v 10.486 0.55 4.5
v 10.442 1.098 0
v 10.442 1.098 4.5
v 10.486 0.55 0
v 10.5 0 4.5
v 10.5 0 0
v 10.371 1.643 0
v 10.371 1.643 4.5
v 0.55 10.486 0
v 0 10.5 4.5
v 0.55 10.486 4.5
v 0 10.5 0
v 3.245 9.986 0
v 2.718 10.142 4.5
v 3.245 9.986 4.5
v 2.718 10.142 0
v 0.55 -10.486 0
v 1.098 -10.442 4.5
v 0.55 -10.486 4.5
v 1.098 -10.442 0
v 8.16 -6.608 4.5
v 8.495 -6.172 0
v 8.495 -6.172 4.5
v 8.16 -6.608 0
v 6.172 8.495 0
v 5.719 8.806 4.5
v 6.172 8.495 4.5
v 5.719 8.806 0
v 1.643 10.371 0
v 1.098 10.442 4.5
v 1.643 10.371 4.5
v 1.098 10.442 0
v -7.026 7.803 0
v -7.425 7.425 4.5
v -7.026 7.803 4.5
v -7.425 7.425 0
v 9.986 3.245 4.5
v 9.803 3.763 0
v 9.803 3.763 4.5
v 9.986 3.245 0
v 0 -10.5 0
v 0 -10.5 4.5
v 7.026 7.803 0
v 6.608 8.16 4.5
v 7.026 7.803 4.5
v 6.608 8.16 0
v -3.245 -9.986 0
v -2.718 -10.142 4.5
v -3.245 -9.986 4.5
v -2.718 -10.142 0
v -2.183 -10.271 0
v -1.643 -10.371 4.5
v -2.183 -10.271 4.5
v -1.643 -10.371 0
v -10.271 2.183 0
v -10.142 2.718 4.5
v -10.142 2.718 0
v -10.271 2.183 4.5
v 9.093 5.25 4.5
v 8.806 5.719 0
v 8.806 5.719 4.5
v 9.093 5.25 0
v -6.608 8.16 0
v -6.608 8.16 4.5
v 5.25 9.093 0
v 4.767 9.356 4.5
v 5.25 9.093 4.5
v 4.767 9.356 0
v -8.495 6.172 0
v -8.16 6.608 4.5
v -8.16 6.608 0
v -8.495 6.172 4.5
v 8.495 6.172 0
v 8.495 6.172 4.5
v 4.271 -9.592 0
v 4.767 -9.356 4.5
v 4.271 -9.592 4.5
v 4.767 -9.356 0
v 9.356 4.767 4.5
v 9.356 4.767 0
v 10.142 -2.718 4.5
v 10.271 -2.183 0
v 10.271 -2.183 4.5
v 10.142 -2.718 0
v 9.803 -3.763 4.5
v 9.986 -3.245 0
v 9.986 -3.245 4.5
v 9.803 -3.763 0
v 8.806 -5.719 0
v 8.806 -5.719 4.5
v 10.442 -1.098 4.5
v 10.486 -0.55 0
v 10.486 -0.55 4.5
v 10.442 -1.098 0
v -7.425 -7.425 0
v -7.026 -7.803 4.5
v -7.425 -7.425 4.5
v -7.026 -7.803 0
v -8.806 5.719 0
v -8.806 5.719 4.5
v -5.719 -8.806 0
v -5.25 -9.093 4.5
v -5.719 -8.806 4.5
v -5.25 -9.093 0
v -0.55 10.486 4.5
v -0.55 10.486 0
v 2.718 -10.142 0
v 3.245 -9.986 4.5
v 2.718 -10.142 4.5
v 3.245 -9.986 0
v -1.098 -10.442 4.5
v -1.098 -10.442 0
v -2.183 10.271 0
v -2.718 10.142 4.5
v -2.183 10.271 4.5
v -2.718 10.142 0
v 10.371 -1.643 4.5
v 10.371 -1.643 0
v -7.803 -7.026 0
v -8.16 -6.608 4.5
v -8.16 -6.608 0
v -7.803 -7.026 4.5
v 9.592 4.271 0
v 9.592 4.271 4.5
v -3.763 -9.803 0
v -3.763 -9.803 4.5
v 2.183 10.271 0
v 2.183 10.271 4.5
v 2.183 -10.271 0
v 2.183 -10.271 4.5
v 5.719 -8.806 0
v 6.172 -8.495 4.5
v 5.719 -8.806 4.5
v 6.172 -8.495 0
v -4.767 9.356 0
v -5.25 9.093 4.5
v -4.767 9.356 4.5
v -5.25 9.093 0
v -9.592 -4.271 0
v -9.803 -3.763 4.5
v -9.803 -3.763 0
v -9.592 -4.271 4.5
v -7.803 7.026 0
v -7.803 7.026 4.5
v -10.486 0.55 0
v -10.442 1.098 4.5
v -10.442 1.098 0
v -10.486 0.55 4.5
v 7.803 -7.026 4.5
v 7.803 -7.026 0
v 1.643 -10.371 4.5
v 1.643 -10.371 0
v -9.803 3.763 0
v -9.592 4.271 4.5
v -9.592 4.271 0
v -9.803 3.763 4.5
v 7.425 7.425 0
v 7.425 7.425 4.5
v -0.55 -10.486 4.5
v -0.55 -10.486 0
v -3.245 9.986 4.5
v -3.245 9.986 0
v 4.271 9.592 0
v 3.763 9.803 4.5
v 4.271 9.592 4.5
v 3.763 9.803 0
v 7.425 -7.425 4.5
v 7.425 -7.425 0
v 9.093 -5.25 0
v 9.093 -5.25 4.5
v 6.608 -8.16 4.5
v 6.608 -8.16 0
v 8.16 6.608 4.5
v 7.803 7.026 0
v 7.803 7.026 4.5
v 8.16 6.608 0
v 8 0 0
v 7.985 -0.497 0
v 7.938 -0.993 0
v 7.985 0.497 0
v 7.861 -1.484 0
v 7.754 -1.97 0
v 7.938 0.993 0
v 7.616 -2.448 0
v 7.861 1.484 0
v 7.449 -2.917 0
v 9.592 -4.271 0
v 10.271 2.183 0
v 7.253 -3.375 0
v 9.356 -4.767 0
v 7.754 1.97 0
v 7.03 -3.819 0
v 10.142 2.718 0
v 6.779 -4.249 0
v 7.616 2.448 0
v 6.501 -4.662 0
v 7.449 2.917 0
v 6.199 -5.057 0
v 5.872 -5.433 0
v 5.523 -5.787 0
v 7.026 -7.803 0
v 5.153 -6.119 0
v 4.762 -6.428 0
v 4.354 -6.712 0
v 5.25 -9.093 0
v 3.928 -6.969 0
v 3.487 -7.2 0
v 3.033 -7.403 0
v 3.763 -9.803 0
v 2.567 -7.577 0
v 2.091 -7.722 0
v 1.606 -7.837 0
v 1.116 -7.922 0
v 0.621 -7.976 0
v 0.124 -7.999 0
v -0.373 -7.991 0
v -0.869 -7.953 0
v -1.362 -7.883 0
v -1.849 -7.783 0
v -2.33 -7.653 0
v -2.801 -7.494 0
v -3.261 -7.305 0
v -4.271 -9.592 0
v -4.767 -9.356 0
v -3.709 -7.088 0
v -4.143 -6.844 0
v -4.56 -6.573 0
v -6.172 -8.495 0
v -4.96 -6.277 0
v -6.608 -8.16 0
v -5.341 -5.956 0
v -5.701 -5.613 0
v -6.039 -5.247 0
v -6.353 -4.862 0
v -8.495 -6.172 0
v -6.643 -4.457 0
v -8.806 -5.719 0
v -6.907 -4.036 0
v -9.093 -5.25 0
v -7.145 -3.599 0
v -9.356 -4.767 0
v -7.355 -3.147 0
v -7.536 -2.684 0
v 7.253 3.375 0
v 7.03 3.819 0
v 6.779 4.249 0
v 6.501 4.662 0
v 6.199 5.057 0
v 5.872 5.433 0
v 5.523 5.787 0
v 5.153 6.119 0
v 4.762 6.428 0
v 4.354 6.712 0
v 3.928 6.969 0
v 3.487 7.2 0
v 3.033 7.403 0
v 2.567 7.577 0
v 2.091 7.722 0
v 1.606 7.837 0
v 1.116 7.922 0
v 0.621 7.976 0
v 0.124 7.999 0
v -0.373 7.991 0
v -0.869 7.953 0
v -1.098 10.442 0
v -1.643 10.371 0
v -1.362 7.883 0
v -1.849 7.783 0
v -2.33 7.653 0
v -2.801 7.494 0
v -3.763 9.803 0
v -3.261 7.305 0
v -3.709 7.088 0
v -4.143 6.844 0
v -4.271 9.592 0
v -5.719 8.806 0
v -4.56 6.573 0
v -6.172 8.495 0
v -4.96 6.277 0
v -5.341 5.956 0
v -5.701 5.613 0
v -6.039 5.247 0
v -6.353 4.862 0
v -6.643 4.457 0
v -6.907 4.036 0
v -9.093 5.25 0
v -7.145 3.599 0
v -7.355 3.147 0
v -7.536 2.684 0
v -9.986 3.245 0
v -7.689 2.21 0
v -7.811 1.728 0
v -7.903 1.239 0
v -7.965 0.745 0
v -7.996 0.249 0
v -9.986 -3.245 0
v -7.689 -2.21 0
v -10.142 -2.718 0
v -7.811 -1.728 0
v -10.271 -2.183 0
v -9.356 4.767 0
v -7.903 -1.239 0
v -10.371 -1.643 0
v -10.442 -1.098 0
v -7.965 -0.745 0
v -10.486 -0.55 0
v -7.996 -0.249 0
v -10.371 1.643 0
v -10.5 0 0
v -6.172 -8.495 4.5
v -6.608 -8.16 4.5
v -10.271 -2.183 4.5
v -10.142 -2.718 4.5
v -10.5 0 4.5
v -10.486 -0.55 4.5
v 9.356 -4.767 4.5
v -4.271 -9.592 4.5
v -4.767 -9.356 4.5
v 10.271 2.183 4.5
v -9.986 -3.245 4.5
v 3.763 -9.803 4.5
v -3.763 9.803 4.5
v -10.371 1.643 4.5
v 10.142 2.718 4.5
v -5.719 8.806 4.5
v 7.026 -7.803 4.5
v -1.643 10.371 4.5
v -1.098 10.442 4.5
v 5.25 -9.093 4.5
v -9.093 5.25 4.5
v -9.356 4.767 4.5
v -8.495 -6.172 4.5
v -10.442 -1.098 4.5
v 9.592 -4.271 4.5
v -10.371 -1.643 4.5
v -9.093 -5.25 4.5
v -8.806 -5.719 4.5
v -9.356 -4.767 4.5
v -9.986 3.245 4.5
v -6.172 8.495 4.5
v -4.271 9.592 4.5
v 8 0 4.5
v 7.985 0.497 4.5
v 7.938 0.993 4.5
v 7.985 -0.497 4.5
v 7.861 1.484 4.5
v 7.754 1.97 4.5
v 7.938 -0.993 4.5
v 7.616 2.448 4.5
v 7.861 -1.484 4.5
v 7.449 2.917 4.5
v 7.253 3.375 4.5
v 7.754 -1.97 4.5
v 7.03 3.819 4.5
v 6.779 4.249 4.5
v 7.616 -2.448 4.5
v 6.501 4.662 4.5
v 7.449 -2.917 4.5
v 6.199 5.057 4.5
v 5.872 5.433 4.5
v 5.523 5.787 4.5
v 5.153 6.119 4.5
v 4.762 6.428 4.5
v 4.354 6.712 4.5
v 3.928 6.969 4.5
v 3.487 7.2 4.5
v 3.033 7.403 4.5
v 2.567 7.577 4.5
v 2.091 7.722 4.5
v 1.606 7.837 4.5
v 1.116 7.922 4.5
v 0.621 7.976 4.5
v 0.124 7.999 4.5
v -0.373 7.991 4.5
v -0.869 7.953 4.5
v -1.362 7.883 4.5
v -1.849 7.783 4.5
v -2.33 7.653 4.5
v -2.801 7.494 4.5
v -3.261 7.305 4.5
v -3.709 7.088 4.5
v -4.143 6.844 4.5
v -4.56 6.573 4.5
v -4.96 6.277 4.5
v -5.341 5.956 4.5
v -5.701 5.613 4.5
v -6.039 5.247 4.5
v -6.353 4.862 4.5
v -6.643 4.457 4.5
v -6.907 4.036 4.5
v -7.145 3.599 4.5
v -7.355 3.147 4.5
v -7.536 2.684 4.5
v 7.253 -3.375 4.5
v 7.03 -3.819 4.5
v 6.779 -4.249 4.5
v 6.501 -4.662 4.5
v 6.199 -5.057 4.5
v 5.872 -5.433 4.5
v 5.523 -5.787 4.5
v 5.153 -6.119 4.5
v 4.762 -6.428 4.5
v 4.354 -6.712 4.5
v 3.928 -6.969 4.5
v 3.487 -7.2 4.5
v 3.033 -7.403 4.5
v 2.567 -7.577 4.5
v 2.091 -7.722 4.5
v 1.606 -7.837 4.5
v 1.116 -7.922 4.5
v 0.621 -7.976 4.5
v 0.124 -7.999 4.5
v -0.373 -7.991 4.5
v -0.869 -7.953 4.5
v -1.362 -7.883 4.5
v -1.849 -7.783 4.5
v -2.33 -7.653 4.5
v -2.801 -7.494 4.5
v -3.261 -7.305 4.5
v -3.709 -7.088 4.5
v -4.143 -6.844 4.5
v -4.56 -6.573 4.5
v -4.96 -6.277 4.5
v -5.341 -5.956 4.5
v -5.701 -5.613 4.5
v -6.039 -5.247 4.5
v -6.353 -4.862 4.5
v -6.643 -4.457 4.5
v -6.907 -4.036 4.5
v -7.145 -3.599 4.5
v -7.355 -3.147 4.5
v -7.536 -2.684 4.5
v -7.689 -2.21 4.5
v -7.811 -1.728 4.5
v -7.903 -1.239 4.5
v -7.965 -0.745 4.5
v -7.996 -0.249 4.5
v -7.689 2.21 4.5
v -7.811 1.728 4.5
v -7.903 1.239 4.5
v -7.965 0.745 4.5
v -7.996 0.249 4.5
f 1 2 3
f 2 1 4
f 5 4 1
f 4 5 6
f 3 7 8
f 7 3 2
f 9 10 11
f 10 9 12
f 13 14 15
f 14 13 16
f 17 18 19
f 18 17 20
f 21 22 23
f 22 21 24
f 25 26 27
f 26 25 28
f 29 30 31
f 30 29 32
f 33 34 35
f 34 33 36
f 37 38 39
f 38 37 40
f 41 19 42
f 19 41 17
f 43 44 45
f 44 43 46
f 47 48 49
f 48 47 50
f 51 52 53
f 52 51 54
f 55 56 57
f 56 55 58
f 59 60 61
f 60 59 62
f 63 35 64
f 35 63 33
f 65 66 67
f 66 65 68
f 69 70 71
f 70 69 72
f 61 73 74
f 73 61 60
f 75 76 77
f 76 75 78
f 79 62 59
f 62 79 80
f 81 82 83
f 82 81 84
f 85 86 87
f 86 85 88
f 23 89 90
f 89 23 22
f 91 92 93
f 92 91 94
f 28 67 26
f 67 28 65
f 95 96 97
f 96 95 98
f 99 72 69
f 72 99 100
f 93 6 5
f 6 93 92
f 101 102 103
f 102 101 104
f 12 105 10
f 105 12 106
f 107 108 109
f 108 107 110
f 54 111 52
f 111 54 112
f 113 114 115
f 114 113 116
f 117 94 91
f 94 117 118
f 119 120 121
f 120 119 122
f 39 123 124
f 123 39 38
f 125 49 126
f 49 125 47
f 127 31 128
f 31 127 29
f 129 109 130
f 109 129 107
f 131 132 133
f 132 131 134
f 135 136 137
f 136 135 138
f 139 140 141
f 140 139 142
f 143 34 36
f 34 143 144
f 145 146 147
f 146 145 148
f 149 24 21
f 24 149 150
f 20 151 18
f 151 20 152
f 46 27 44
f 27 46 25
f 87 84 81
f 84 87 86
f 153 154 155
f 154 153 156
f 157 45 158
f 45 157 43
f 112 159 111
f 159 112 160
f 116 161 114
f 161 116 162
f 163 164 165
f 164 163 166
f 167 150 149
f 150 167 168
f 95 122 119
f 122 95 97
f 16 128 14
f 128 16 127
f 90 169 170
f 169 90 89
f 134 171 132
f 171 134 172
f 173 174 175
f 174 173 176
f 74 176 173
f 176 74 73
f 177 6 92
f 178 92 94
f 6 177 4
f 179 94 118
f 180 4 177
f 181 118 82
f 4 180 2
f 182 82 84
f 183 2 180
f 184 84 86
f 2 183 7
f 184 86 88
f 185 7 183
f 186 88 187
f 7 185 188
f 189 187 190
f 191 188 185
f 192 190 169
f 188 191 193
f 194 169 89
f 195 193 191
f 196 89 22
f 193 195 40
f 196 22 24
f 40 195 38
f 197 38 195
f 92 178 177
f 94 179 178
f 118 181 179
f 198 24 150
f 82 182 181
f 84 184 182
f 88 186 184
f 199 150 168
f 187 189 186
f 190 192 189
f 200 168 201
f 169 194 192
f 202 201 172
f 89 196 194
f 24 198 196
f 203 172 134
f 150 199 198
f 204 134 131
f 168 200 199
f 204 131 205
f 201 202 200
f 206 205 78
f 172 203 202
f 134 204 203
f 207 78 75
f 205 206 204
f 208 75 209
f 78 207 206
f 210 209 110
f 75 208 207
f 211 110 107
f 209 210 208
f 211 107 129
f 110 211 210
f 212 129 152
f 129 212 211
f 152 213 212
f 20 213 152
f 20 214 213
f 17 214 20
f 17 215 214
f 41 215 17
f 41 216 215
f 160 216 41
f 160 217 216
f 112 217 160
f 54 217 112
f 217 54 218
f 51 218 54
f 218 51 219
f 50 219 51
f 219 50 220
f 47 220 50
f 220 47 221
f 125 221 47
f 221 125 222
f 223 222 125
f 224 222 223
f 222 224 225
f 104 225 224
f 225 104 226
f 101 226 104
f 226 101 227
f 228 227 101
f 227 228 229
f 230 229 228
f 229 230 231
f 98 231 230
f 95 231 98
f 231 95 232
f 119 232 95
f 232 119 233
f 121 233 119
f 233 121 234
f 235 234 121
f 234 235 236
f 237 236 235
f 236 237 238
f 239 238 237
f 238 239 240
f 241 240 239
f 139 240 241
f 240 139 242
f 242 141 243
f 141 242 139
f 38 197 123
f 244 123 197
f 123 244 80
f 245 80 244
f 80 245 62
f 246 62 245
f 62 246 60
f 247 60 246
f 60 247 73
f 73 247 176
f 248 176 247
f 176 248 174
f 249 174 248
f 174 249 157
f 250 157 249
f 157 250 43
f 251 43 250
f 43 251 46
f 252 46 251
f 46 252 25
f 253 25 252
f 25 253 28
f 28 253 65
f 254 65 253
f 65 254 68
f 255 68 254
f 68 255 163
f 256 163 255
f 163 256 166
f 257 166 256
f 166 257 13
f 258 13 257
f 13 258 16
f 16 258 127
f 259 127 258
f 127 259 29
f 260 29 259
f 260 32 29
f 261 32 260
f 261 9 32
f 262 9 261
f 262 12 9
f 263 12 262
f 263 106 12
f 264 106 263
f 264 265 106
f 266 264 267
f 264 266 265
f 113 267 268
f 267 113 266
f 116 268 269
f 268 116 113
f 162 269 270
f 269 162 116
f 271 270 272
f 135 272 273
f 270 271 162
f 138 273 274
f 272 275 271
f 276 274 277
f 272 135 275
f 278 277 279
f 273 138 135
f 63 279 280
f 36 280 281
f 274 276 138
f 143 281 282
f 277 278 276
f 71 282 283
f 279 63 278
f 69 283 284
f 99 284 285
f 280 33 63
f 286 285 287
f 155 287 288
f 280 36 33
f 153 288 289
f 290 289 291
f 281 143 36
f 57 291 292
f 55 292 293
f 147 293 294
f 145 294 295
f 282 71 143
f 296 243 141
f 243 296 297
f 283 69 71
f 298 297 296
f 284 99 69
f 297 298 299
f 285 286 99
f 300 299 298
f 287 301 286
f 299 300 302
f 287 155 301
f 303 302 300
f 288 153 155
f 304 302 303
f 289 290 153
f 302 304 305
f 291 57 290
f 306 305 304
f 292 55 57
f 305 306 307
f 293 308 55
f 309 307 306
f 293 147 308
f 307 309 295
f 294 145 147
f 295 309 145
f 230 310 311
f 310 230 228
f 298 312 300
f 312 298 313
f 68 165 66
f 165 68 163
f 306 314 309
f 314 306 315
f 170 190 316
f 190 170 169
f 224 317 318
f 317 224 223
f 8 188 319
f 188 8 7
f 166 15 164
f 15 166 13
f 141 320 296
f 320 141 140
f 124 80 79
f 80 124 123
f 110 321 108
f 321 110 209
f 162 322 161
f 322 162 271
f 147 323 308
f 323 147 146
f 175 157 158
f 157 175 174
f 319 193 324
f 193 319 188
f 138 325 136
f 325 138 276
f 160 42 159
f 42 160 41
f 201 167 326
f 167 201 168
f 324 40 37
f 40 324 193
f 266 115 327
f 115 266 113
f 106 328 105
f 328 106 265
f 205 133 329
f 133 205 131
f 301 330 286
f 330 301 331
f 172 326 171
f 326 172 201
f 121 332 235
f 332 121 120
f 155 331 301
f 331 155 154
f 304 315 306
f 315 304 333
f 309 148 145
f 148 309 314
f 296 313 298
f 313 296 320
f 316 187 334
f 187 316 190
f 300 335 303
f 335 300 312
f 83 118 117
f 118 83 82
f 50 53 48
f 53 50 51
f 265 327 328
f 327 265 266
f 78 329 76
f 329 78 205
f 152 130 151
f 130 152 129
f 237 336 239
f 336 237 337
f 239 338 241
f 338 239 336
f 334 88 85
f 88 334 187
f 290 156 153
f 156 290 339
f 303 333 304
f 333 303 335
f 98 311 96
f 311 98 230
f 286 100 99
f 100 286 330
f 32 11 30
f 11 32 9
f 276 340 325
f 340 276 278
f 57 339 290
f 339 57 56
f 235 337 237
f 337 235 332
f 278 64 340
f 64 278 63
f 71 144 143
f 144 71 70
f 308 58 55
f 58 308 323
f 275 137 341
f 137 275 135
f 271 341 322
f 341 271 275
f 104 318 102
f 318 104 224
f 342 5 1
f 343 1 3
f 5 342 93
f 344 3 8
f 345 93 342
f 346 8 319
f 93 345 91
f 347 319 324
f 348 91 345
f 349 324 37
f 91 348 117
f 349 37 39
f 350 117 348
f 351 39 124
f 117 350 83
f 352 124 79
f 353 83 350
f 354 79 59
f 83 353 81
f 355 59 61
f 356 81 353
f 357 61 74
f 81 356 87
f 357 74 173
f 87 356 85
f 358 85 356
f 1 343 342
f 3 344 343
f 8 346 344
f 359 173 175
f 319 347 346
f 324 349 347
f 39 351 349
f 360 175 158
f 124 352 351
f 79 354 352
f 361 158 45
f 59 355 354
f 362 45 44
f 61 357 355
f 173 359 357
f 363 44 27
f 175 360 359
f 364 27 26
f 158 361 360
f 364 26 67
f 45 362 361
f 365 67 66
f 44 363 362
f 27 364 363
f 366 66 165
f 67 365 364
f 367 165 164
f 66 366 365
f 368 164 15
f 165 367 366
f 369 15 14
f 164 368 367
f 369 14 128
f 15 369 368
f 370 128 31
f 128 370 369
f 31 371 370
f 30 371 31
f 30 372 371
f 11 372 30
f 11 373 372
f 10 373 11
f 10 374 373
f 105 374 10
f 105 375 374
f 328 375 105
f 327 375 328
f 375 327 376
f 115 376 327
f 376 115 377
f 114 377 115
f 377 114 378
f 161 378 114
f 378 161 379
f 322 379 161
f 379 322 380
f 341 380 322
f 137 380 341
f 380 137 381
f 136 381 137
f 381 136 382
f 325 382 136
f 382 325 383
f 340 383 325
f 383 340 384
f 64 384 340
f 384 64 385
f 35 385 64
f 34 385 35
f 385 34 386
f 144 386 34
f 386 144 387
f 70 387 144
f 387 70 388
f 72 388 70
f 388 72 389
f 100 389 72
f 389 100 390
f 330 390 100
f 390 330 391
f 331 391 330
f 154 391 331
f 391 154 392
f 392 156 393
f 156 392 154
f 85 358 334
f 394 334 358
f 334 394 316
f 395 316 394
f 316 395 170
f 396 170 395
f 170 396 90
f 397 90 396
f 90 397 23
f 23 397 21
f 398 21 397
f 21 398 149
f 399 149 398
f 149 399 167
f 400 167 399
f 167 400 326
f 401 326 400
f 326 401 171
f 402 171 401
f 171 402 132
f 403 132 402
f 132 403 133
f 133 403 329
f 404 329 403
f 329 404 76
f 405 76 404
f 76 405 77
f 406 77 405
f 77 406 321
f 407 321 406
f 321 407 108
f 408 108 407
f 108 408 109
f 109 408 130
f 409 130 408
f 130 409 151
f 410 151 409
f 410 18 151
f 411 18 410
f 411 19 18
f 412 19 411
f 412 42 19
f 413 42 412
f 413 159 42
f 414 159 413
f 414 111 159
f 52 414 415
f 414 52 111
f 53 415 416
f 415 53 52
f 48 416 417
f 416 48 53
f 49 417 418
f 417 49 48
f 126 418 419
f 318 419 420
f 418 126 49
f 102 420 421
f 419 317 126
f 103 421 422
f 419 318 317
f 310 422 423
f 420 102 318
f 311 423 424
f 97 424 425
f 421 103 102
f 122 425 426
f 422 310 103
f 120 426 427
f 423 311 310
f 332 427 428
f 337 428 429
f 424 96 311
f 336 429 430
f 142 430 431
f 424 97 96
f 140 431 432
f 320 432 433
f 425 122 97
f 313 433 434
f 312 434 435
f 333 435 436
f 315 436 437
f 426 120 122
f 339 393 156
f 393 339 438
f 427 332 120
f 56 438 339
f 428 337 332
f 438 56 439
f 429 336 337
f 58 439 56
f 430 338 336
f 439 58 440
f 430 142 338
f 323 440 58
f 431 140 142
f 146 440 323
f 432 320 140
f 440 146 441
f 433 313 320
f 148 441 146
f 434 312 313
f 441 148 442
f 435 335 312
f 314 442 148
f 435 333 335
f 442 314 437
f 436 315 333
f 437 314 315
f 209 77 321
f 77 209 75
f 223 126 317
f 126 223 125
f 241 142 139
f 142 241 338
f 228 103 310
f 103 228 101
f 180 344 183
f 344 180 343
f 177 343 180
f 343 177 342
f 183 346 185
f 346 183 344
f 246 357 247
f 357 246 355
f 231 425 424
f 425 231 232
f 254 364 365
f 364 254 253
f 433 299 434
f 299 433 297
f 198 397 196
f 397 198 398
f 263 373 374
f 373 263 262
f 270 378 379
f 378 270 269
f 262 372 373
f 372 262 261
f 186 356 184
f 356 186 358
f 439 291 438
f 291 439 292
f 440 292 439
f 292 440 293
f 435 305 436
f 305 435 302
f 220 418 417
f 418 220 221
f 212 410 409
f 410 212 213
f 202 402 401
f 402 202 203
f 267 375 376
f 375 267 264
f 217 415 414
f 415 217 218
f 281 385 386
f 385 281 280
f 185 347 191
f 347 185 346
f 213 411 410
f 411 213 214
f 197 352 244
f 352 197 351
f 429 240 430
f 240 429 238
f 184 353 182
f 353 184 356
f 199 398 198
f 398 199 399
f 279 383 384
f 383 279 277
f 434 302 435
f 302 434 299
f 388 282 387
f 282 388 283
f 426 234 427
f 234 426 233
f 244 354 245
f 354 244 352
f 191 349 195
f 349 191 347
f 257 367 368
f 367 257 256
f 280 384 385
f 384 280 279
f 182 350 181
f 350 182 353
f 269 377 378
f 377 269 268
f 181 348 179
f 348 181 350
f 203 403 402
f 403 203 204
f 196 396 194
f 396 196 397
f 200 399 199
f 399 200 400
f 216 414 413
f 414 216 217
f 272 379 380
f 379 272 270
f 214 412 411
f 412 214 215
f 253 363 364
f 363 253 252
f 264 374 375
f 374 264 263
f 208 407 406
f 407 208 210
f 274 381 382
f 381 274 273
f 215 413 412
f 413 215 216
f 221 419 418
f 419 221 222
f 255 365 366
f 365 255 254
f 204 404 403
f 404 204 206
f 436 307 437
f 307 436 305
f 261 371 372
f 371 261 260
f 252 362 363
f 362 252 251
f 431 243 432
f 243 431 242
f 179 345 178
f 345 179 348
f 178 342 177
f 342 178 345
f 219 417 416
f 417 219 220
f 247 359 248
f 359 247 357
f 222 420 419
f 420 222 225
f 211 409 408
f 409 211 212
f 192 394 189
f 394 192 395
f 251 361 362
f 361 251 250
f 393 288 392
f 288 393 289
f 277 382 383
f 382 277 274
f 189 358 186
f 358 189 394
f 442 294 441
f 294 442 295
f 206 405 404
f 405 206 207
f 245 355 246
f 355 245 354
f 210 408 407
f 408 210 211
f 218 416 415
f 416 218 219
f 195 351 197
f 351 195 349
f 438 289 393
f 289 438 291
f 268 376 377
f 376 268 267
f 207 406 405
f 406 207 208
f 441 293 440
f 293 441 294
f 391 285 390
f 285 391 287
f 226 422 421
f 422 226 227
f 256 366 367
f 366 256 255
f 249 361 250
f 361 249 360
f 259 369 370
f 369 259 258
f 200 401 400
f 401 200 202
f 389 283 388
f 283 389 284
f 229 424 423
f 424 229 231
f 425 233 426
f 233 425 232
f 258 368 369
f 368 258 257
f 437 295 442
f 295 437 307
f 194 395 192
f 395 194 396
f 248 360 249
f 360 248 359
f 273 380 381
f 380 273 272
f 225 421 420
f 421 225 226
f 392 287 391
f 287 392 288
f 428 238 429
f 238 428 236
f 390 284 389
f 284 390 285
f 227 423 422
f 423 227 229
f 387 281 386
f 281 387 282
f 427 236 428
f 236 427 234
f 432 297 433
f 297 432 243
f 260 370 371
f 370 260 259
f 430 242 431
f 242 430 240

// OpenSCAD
// Sealing ring for water tube
module dring (do=21, di=16, hg=11, dg=3, ds=2.5, ug=1)
{
    th = hg - (dg + ds + ug);
    difference () {
        cylinder (r = do/2, h = th);
        translate ([0, 0, -th])
            cylinder (r = di/2, h = 3*th);
    }
}

dring ($fa=3, $fs=.5);
